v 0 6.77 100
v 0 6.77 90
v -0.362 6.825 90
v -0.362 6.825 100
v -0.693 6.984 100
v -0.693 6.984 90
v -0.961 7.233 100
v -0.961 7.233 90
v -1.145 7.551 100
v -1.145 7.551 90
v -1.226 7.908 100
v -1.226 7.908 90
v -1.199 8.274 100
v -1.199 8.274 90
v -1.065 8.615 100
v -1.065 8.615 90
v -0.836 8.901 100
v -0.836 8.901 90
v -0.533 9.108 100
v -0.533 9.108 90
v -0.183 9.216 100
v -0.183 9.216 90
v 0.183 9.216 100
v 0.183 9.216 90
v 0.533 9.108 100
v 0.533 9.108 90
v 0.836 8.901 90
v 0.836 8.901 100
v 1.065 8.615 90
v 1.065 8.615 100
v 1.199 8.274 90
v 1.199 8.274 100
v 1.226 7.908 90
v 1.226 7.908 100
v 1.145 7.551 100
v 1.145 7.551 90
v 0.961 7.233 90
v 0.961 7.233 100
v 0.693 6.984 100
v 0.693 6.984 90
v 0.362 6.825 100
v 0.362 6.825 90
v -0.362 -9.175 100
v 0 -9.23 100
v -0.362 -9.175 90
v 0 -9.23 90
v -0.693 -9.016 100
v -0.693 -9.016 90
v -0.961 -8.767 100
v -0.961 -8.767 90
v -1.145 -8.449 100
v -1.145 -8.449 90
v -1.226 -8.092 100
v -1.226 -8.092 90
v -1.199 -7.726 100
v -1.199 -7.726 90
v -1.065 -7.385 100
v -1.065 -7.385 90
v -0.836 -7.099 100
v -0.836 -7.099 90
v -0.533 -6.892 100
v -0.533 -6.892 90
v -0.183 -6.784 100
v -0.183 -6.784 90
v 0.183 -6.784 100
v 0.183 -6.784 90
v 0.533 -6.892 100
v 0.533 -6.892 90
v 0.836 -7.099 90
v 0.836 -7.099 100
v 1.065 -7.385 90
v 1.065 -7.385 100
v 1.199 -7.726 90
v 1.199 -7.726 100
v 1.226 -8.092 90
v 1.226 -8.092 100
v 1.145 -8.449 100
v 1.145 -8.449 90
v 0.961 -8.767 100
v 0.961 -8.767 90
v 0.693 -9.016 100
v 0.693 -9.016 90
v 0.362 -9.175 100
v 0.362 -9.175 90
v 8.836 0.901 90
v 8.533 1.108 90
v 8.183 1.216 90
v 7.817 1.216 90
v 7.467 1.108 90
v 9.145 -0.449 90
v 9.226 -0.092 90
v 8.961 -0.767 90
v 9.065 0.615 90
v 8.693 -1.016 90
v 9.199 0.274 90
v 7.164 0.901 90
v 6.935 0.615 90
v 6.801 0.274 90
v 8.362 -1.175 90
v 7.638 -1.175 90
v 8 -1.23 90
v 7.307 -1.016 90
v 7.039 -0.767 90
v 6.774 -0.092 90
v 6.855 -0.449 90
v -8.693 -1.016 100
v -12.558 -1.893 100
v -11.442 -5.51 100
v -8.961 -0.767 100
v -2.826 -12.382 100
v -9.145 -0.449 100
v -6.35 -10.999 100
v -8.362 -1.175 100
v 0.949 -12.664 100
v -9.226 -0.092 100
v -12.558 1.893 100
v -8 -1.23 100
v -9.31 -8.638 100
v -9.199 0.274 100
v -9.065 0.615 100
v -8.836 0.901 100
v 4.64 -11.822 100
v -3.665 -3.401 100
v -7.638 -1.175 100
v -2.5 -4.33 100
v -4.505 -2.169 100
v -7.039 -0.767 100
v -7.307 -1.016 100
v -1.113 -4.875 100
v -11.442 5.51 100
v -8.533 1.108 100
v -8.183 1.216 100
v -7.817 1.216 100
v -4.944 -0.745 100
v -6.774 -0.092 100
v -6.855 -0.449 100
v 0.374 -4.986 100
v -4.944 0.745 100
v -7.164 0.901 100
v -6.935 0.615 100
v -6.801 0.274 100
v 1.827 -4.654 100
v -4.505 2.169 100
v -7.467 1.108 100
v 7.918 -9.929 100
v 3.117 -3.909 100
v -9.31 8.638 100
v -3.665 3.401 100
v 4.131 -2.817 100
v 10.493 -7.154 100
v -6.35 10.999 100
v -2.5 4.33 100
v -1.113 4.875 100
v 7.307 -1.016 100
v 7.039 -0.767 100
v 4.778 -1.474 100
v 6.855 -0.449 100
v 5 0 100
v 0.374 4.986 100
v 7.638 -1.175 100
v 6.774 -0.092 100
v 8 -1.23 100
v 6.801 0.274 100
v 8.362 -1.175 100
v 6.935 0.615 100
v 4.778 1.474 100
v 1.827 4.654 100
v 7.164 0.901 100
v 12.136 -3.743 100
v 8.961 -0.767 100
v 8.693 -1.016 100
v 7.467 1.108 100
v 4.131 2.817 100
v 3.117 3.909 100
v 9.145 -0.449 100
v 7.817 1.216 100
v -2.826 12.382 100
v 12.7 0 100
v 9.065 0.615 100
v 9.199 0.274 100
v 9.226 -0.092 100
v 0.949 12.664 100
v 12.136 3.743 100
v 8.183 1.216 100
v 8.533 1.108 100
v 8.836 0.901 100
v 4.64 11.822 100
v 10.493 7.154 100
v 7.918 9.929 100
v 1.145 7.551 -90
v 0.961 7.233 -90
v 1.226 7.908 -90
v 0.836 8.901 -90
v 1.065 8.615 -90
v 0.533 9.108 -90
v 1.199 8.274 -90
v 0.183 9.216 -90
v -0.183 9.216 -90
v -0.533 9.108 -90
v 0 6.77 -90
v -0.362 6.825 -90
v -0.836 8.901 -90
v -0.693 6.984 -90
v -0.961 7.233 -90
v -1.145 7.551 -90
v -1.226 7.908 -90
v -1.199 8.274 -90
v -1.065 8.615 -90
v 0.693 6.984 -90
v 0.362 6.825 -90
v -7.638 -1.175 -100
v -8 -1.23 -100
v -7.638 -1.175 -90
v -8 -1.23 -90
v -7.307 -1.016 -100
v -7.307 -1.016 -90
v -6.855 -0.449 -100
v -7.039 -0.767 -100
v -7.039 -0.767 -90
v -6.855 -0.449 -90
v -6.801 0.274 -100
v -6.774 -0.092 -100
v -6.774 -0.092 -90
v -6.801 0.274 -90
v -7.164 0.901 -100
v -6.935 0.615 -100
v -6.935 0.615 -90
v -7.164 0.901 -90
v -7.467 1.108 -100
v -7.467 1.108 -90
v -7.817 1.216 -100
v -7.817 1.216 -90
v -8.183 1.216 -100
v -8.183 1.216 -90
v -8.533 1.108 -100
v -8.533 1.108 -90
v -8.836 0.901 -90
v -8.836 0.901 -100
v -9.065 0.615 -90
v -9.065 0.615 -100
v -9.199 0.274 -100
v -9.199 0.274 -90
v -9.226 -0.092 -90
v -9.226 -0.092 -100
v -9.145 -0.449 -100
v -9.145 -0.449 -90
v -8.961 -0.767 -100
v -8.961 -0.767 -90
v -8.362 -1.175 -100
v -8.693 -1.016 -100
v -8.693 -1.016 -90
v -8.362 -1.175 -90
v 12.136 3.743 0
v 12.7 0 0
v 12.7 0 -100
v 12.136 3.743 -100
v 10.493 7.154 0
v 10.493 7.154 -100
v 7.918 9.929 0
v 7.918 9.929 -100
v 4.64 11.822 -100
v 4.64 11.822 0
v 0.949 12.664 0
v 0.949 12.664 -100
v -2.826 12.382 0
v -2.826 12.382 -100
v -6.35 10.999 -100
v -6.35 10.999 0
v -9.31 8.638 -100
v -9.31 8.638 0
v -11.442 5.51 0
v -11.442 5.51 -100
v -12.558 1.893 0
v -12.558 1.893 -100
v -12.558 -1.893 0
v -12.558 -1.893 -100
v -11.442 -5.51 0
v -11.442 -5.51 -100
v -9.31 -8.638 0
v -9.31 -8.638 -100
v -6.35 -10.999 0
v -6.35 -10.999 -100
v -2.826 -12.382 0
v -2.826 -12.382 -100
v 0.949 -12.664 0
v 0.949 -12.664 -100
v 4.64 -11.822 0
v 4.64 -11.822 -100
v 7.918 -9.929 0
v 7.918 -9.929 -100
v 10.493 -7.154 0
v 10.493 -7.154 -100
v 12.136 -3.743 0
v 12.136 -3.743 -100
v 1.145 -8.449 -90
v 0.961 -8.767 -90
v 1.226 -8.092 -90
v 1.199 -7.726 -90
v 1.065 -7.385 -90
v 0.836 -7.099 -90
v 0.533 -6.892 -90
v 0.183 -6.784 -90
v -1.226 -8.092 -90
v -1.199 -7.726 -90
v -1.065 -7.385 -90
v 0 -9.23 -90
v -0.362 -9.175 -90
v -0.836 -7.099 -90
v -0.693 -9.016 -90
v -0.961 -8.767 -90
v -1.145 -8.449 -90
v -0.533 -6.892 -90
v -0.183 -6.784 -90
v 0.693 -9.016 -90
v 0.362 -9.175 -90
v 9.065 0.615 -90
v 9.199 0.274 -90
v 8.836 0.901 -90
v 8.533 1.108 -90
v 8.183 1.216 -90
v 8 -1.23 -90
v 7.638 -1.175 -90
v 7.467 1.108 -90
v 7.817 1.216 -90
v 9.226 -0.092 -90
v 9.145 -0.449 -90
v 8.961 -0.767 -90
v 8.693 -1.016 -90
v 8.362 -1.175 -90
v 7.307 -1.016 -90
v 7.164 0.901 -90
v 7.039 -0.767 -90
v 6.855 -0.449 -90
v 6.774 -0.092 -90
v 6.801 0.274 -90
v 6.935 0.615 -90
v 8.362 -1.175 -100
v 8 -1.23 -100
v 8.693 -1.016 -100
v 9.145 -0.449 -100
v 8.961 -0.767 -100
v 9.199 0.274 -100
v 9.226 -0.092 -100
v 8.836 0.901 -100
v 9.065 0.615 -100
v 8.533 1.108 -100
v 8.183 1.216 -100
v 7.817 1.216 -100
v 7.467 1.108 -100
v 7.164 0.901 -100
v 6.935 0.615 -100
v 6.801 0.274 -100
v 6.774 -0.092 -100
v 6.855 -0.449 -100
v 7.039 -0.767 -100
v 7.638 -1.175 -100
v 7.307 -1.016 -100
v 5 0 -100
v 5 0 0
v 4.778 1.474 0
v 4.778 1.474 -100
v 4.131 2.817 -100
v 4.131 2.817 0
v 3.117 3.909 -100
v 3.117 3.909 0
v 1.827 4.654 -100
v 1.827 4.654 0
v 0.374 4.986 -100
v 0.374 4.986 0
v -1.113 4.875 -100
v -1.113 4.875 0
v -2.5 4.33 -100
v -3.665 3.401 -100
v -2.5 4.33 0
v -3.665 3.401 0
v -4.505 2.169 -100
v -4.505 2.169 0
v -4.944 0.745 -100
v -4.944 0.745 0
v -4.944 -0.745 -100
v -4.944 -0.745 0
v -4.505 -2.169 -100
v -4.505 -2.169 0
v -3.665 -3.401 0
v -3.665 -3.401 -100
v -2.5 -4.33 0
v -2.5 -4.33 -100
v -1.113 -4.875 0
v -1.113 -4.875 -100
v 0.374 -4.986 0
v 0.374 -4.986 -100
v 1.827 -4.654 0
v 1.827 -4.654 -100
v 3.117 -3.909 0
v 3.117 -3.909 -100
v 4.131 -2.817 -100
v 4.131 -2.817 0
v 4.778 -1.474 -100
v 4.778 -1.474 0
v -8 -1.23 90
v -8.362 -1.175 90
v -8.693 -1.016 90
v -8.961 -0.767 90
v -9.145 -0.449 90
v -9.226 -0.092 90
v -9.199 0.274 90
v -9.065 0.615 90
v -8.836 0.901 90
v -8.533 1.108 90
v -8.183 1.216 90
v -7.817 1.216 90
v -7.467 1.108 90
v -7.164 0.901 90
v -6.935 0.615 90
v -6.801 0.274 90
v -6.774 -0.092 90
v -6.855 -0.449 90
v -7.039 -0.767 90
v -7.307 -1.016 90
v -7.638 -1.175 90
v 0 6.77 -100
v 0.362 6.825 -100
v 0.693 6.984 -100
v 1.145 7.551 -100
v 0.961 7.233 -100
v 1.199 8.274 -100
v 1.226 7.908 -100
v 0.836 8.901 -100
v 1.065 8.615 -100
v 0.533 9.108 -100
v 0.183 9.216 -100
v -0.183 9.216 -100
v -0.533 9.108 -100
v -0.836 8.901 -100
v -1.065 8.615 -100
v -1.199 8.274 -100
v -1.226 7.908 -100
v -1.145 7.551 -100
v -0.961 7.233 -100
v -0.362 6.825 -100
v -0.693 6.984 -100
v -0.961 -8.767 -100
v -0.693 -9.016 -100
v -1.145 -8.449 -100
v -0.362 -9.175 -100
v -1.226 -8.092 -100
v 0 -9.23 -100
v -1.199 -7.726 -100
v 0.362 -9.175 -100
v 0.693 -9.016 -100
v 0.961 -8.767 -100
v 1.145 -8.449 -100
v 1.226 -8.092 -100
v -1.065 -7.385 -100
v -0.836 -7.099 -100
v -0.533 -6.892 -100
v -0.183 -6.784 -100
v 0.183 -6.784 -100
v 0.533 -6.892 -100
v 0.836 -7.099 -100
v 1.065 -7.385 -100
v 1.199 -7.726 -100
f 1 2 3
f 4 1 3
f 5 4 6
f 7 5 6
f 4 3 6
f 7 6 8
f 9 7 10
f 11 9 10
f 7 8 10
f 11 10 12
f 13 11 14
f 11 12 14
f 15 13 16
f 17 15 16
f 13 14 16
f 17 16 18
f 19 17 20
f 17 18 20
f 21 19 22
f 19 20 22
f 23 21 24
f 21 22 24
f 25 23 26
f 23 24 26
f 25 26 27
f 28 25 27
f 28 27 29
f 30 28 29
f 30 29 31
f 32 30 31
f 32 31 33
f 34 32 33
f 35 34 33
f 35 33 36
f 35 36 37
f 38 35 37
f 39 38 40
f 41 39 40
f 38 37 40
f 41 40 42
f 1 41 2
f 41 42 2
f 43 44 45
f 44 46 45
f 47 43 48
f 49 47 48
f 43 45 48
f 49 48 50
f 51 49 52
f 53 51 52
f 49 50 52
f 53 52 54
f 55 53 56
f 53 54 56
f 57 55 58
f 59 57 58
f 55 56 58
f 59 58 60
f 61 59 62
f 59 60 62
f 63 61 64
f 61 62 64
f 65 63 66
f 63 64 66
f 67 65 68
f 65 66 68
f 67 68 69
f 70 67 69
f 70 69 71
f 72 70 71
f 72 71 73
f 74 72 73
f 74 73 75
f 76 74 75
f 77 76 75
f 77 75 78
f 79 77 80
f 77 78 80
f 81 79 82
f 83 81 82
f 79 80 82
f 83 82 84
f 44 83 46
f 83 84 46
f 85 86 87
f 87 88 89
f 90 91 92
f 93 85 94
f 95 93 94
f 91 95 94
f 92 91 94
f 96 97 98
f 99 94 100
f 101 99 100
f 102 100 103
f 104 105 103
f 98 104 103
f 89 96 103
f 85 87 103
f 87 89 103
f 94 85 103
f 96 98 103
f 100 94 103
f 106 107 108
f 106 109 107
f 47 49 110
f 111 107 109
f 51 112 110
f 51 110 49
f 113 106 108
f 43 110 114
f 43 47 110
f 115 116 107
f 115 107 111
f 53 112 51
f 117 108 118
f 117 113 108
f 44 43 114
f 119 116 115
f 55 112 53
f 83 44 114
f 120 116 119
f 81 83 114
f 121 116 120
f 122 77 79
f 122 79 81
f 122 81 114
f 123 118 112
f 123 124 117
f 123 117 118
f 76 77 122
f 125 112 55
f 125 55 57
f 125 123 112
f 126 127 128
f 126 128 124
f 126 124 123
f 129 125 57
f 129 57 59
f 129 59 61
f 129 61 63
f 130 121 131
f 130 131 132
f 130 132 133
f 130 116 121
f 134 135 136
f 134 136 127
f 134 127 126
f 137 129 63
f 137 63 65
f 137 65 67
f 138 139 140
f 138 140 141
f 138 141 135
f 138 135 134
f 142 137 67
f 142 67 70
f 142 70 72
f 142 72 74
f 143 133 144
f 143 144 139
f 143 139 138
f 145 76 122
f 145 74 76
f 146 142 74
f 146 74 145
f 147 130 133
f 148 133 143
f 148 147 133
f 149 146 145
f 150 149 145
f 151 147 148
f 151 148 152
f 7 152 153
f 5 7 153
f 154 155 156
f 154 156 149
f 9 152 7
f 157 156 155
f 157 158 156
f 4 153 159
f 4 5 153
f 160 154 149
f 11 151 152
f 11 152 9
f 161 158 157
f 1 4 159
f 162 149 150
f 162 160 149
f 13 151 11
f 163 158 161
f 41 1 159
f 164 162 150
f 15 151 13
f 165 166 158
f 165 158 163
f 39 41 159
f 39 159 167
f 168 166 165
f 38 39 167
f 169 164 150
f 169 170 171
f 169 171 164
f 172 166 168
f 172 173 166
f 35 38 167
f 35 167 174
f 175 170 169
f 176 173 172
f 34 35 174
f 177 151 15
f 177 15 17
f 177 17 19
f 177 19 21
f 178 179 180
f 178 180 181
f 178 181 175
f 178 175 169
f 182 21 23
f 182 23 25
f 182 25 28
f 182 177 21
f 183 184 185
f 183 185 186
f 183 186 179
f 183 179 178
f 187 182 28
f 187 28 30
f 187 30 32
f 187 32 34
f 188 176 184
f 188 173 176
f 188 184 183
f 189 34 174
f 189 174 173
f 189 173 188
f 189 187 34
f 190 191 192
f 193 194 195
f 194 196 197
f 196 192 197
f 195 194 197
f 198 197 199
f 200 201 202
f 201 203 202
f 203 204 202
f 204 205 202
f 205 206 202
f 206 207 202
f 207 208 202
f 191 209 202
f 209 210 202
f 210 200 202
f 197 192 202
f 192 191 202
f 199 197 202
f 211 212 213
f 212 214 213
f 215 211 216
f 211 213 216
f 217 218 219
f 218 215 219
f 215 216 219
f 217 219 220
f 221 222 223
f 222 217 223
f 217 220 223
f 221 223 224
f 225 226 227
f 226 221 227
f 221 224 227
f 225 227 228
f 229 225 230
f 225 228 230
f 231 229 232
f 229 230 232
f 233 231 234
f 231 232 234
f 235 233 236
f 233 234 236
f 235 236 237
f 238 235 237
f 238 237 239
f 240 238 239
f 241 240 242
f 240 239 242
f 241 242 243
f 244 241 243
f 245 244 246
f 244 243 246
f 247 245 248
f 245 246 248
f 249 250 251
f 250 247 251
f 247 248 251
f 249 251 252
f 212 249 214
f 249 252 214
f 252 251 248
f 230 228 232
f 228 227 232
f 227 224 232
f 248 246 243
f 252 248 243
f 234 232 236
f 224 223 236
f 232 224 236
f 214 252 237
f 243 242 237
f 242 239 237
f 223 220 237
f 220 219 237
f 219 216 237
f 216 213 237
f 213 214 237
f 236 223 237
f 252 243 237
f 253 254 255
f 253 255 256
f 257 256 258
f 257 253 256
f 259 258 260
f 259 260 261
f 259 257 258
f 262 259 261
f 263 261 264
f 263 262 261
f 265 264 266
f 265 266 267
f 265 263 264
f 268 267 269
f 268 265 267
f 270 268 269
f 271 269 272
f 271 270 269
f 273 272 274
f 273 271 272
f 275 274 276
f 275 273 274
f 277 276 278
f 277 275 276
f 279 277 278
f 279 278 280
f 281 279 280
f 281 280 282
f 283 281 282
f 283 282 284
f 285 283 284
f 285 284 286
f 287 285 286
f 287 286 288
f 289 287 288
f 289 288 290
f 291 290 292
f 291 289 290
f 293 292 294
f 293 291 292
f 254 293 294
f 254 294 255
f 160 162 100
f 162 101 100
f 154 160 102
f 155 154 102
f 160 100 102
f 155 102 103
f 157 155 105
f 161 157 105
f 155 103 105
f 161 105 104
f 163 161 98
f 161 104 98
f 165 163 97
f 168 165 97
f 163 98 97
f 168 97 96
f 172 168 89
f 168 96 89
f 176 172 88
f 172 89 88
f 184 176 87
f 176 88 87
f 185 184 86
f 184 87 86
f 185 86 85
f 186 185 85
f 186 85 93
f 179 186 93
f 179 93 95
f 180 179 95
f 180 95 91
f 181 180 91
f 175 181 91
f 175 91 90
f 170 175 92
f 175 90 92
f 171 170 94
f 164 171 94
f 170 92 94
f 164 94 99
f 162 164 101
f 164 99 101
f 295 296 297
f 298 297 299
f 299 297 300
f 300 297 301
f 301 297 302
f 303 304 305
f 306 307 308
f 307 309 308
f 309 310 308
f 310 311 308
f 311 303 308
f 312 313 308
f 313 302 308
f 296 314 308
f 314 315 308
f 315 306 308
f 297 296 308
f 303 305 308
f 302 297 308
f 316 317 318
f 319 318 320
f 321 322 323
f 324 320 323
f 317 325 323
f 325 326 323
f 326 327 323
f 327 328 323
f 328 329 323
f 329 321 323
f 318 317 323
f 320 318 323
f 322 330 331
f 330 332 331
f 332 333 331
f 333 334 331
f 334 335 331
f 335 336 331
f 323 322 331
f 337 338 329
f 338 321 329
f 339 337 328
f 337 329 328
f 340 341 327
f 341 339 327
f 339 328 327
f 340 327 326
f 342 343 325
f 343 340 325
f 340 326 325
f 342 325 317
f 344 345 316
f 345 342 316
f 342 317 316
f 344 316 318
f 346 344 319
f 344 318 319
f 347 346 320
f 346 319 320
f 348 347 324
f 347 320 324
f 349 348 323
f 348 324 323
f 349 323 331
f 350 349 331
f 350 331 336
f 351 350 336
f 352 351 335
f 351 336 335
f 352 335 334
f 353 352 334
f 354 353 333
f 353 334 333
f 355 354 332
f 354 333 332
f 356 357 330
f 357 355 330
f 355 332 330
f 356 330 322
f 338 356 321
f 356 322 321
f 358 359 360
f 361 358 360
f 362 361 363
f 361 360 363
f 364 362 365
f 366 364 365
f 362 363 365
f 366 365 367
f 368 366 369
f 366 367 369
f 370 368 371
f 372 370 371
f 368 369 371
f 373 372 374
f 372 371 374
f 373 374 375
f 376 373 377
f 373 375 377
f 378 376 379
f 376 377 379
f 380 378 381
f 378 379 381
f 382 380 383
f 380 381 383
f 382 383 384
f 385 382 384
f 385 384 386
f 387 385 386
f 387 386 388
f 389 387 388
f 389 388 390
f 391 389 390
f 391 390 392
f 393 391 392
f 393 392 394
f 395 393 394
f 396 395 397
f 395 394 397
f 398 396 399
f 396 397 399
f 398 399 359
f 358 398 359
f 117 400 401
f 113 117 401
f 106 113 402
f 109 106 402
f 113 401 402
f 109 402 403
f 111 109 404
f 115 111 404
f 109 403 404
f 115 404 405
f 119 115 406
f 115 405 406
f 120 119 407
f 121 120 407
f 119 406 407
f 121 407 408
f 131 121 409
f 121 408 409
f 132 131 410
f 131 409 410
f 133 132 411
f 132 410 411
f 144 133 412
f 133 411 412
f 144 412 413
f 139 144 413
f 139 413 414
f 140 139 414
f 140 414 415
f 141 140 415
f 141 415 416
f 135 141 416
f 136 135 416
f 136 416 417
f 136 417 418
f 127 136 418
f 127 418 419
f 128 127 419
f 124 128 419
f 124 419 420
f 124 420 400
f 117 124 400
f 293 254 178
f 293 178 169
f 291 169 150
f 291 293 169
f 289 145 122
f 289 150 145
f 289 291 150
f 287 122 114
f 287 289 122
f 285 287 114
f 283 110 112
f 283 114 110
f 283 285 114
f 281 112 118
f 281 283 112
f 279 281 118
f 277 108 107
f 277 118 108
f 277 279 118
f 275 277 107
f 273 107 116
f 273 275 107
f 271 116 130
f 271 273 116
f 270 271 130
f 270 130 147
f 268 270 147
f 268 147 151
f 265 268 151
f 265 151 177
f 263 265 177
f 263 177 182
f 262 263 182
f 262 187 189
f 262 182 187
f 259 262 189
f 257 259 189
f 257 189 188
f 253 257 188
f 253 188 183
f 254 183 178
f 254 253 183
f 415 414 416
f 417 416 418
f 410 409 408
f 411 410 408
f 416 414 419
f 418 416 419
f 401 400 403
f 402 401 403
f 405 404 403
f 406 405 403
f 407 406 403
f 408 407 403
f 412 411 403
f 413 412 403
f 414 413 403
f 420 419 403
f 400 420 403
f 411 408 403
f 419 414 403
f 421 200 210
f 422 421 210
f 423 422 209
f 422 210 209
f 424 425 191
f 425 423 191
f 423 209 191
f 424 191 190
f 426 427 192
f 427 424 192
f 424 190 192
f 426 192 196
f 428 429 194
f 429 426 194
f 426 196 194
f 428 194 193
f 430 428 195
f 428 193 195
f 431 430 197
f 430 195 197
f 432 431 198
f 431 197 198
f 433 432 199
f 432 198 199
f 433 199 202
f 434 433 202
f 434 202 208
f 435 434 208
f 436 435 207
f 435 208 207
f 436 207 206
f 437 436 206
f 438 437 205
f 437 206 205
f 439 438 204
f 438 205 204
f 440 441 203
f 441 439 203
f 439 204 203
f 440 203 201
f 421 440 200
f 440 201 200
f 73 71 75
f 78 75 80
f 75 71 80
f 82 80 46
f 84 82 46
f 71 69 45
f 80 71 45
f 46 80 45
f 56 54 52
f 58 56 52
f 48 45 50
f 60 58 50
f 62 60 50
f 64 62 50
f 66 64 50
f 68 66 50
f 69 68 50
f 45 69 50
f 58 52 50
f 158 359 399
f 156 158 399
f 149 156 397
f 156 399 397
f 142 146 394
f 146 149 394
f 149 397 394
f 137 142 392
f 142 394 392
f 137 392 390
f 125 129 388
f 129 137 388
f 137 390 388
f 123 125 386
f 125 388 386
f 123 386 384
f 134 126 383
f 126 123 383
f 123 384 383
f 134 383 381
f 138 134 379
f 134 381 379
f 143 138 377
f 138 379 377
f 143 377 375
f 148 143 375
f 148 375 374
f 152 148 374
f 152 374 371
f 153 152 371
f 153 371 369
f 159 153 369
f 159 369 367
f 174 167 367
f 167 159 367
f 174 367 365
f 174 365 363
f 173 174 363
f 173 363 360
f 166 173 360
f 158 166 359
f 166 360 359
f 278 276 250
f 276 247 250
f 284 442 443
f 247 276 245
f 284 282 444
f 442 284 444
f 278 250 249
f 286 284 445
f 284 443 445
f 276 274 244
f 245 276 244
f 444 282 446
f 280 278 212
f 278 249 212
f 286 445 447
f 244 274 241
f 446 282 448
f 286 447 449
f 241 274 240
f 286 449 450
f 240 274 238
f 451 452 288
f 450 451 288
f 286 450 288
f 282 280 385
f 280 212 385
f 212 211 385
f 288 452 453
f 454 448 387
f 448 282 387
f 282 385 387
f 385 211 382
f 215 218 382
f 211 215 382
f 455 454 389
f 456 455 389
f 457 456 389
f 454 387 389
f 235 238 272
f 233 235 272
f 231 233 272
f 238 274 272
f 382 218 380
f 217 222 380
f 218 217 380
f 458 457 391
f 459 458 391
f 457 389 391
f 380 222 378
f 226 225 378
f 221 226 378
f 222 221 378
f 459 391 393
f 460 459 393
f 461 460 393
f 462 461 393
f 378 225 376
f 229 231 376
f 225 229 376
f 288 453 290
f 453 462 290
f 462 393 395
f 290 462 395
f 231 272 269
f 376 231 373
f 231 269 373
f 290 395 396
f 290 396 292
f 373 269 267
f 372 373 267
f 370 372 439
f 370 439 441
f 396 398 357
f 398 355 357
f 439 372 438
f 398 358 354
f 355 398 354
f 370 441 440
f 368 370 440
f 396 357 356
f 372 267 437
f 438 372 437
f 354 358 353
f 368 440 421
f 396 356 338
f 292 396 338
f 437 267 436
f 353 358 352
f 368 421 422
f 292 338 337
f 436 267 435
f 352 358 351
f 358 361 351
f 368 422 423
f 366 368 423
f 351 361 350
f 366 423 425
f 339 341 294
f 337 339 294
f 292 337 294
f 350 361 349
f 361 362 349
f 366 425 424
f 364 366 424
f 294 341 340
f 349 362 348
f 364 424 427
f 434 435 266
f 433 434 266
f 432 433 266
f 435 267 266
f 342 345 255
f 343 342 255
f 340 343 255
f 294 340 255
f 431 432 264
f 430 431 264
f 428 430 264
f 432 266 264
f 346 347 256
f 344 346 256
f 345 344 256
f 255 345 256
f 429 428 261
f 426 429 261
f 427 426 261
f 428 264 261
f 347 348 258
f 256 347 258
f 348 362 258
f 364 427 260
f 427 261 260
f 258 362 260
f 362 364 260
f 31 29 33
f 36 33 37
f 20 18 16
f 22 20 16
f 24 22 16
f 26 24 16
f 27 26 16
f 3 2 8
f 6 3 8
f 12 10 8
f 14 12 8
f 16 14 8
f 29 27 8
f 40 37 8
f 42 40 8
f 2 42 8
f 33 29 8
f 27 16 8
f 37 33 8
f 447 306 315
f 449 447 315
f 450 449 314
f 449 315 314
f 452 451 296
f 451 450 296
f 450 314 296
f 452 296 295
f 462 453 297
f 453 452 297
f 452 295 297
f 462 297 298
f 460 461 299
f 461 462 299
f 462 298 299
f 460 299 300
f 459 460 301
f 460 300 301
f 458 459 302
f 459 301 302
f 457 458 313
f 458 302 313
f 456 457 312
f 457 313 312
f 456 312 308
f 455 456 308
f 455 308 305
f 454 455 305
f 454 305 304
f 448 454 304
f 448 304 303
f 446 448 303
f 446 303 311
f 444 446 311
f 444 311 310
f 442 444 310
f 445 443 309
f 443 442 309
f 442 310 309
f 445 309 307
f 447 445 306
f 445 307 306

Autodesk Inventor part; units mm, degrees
ref_plane "YZ Plane" through (0, 0, 0) normal (1, 0, 0) x (0, 1, 0)
ref_plane "XZ Plane" through (0, 0, 0) normal (0, 1, 0) x (-1, 0, 0)
ref_plane "XY Plane" through (0, 0, 0) normal (0, 0, 1) x (1, 0, 0)
sketch "Sketch1" plane through (0, 0, 0) normal (0, 0, 1) x (1, 0, 0)
  circle A0 centre (0, 0) radius 12.7
  circle A1 centre (0, 0) radius 5
  dimension "d0" = 25.4
  dimension "d1" = 10
extrude "Extrusion1" add sketch "Sketch1" along normal mid plane 200
sketch "Sketch2" plane through (0, 0, 100) normal (0, 0, 1) x (1, 0, 0)
  line L0 (-17.78, 0) -> (17.78, 0) projected
  line L1 (0, -17.78) -> (0, 17.78) projected
  circle A0 centre (0, 0) radius 8 construction
  point P0 (0, 8)
  point P1 (8, 0)
  point P2 (0, -8)
  point P3 (-8, 0)
  dimension "d4" = 16
hole "Hole1" at (0, 8, 100) at (8, 0, 100) at (0, -8, 100) at (-8, 0, 100) direction (0, 0, -1) diameter 2.459 depth 10 thread size "M3x0.5" class "6H" standard "ISO Metric profile"
mirror "Mirror1" about plane through (0, 0, 0) normal (0, 0, 1) of "Hole1"
properties part number "barra solida hueca"
